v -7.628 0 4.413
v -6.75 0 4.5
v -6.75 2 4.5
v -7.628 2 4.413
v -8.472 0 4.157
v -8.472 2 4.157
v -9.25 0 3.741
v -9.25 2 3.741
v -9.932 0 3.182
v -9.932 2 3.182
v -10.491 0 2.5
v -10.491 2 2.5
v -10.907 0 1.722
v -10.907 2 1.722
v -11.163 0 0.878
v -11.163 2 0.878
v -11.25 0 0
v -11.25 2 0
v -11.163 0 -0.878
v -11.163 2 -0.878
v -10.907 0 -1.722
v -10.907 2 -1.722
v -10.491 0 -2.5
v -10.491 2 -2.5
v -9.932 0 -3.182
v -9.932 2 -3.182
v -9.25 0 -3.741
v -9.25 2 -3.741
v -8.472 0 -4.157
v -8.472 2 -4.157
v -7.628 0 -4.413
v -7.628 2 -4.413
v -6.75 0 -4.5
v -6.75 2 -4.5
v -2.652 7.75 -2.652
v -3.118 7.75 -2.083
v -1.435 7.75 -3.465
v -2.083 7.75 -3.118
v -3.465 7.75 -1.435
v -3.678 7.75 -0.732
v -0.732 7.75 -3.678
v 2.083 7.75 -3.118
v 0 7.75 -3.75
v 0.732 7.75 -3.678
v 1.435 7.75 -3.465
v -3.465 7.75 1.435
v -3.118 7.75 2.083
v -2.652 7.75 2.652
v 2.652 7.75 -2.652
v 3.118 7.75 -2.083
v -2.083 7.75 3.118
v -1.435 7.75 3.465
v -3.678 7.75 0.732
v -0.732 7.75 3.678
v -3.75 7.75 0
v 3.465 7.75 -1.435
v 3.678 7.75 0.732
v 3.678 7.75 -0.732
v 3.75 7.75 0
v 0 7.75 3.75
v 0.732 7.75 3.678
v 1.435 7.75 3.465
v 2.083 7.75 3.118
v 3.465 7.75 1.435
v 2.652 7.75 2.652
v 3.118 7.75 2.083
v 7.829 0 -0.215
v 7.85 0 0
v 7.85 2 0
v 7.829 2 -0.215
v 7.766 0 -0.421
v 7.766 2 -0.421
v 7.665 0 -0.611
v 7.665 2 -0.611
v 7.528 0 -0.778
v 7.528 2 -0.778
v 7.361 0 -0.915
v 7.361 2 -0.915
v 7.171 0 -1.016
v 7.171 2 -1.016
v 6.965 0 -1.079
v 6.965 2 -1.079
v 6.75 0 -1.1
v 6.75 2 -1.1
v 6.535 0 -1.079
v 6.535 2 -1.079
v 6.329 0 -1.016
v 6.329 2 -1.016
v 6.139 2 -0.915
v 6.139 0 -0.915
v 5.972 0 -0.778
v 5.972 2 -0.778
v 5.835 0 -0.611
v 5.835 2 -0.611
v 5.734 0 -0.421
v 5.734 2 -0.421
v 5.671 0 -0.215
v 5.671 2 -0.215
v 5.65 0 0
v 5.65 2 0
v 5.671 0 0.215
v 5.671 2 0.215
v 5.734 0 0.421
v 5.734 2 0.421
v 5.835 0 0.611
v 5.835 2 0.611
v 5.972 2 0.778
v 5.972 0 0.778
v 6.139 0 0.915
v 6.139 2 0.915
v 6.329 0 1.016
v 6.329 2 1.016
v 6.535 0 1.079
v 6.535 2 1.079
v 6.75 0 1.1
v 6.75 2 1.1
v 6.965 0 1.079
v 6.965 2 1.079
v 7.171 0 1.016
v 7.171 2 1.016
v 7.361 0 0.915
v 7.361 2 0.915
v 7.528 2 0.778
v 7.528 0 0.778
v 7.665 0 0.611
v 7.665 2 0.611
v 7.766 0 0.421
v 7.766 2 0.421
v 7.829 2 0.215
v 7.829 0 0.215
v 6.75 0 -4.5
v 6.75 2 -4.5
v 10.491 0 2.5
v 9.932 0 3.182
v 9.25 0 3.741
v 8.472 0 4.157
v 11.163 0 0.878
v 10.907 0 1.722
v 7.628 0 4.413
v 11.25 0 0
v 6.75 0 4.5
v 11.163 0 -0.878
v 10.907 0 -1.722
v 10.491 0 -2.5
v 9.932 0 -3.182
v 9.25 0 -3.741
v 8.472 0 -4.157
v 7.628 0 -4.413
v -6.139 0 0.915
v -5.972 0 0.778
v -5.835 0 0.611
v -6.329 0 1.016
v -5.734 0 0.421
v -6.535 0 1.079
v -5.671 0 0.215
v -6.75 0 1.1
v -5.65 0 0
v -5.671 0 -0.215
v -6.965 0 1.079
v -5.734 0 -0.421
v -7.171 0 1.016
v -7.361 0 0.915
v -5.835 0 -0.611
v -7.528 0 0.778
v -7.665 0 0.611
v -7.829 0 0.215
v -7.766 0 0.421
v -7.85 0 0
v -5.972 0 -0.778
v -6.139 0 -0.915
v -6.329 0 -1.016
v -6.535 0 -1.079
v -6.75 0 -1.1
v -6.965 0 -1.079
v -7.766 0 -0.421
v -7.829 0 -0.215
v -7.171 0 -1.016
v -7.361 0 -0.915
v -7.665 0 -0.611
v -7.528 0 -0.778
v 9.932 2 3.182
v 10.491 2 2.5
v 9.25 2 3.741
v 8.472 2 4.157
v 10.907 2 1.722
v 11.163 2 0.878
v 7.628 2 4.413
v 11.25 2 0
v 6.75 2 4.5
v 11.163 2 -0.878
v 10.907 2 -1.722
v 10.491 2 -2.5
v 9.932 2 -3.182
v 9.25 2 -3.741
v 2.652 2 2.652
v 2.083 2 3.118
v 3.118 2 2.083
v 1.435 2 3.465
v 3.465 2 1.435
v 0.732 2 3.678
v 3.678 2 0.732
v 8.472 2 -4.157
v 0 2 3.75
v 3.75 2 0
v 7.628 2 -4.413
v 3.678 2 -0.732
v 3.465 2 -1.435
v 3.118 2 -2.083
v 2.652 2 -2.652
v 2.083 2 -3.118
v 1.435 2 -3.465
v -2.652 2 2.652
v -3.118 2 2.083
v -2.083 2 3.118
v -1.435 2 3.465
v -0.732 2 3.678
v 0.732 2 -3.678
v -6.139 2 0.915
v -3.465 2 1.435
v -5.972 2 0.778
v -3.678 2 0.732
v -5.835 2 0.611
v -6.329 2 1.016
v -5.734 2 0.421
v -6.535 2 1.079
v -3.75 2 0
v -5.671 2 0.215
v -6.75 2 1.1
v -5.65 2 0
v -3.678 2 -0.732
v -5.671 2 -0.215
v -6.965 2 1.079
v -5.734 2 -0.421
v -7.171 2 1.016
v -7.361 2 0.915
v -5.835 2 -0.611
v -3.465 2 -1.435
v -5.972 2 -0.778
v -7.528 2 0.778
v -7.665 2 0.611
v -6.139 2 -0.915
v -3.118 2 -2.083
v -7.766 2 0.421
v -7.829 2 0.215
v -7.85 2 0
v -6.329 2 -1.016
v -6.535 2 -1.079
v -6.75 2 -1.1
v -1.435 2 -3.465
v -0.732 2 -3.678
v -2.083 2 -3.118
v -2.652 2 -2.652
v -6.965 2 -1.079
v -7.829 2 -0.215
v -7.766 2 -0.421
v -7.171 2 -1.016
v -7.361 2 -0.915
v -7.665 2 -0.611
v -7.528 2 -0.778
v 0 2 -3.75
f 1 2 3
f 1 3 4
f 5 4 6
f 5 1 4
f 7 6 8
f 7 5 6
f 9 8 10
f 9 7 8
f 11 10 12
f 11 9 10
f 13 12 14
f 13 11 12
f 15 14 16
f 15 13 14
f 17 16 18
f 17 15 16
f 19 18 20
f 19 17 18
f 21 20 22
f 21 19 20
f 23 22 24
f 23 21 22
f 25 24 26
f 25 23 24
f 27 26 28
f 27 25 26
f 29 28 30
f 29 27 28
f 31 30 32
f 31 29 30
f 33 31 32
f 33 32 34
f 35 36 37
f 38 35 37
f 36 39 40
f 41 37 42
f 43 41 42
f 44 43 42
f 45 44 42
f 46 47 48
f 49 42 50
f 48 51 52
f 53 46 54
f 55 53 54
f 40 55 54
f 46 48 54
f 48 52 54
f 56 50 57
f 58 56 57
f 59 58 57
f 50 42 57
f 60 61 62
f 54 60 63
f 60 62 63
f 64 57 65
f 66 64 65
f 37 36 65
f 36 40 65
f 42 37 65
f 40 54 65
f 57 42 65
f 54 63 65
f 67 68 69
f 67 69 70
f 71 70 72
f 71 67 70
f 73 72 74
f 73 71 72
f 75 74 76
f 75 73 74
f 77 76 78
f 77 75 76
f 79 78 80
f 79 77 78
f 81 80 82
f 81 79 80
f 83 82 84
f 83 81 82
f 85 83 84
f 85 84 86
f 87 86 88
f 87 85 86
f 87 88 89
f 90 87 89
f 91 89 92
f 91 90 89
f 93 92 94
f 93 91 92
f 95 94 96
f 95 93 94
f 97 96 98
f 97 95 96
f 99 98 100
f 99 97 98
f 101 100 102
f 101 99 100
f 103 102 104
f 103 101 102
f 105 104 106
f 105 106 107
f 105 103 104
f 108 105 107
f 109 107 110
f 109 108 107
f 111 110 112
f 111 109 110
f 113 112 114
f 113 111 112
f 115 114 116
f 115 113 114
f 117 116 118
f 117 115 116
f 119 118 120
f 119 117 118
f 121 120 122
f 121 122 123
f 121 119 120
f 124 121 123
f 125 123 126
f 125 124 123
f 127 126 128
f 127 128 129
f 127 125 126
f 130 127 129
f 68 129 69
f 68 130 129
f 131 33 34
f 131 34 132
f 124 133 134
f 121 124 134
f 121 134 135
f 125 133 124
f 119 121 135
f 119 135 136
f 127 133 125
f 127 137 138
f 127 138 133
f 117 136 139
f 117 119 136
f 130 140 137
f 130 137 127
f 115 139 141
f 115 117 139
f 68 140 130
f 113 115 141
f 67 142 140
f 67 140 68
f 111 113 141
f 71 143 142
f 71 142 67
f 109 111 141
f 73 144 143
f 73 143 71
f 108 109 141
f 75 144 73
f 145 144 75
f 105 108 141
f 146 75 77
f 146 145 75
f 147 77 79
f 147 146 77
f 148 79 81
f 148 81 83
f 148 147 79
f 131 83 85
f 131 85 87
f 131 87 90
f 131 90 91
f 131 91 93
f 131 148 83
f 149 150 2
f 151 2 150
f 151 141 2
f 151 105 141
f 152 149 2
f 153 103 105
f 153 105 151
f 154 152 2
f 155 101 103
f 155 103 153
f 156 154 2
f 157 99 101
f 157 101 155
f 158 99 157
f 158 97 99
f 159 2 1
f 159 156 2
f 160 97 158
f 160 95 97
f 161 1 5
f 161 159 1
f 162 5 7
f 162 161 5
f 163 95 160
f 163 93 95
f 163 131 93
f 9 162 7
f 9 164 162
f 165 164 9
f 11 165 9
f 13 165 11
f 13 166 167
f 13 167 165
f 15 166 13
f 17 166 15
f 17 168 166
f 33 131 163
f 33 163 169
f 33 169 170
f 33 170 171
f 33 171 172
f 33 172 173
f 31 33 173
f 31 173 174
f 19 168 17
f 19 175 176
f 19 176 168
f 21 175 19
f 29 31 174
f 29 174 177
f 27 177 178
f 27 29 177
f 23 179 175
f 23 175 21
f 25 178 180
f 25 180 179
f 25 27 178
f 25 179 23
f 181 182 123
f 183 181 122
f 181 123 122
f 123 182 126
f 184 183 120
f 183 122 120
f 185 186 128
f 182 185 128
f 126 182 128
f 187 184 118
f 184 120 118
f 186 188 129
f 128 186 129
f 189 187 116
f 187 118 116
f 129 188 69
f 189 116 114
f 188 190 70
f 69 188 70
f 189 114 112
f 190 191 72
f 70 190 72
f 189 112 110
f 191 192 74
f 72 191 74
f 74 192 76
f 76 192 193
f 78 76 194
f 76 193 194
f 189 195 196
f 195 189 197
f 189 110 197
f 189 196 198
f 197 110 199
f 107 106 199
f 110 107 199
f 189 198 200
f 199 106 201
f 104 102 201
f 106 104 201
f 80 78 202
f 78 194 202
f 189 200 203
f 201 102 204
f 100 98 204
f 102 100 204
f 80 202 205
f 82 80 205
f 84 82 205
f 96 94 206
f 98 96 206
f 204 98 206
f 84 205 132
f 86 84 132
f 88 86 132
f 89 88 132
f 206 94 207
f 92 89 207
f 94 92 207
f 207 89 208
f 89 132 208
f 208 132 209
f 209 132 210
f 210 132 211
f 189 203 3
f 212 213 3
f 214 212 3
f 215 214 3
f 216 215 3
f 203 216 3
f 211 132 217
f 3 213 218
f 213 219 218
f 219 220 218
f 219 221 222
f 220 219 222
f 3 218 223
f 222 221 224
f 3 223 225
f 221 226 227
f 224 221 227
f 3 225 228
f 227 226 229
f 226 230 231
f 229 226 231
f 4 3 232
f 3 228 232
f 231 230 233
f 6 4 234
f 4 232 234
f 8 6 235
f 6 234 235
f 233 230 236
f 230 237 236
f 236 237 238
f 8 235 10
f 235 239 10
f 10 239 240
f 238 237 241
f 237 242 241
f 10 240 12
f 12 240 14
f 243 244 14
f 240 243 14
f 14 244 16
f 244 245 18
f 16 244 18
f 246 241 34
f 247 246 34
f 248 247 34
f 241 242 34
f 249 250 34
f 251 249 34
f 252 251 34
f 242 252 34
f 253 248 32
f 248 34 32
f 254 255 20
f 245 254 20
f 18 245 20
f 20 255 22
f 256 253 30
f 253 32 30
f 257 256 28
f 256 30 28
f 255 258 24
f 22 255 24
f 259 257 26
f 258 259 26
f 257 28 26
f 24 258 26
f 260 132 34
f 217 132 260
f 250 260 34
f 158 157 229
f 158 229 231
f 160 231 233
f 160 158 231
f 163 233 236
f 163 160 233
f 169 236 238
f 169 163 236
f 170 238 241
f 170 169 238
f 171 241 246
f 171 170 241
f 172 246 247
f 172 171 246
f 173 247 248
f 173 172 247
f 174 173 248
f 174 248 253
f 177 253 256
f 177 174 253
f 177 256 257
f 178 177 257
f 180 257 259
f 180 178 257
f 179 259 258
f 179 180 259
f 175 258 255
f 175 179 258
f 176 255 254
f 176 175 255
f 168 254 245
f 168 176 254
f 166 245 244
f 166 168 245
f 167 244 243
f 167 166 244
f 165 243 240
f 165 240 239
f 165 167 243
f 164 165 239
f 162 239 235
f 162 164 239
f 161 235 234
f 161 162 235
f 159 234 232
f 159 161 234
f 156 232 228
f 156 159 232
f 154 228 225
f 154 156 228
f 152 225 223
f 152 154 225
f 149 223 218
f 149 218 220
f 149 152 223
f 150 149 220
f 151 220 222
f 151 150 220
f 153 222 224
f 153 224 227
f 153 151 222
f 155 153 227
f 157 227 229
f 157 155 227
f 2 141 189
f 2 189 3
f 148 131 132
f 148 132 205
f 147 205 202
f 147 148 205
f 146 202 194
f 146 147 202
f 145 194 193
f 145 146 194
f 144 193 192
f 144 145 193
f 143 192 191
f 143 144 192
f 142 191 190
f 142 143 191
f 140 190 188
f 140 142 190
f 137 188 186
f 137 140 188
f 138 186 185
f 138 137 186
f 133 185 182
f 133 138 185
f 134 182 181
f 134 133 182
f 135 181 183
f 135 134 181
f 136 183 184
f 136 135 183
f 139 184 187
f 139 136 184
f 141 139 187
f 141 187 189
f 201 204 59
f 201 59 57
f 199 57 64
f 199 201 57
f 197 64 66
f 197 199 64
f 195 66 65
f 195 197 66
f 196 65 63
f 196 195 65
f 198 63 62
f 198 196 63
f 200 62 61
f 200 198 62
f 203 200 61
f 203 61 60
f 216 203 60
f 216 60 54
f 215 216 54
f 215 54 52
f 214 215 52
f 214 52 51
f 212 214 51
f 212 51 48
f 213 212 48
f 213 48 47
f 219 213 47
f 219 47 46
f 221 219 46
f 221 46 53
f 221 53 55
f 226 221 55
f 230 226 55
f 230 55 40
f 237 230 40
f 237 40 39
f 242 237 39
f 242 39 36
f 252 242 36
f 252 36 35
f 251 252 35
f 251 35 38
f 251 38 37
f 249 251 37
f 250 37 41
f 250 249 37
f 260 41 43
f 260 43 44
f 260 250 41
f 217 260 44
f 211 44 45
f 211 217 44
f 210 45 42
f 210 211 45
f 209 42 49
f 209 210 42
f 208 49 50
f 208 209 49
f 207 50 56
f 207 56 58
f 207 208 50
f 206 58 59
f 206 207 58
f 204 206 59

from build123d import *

# Parameters (mm, degrees)
SKETCH1_R           = 1.1
SKETCH1_R_2         = 3.75
BOSS_EXTRUDE3_DEPTH = 2
SKETCH3_R           = 3.75
BOSS_EXTRUDE4_DEPTH = 7.75


with BuildPart() as part:
    # Sketch1 → Boss-Extrude3 (new body)
    with BuildSketch(Plane(origin=(0, 0, 0), x_dir=(1, 0, 0), z_dir=(0, 1, 0))):
        with BuildLine():
            Line((-6.75, 4.499502967), (6.75, 4.499502967))
            ThreePointArc((6.75, 4.499502967), (11.249502967, 0), (6.75, -4.499502967))
            Line((6.75, -4.499502967), (-6.75, -4.499502967))
            ThreePointArc((-6.75, -4.499502967), (-11.249502967, 0), (-6.75, 4.499502967))
        make_face()
        with Locations((-6.75, 0)):
            Circle(SKETCH1_R, mode=Mode.SUBTRACT)
        with Locations((6.75, 0)):
            Circle(SKETCH1_R, mode=Mode.SUBTRACT)
        Circle(SKETCH1_R_2, mode=Mode.SUBTRACT)
    extrude(amount=BOSS_EXTRUDE3_DEPTH)

    # Sketch3 → Boss-Extrude4 (add)
    with BuildSketch(Plane.XZ):
        Circle(SKETCH3_R)
    extrude(amount=-BOSS_EXTRUDE4_DEPTH)


solid = part.part
